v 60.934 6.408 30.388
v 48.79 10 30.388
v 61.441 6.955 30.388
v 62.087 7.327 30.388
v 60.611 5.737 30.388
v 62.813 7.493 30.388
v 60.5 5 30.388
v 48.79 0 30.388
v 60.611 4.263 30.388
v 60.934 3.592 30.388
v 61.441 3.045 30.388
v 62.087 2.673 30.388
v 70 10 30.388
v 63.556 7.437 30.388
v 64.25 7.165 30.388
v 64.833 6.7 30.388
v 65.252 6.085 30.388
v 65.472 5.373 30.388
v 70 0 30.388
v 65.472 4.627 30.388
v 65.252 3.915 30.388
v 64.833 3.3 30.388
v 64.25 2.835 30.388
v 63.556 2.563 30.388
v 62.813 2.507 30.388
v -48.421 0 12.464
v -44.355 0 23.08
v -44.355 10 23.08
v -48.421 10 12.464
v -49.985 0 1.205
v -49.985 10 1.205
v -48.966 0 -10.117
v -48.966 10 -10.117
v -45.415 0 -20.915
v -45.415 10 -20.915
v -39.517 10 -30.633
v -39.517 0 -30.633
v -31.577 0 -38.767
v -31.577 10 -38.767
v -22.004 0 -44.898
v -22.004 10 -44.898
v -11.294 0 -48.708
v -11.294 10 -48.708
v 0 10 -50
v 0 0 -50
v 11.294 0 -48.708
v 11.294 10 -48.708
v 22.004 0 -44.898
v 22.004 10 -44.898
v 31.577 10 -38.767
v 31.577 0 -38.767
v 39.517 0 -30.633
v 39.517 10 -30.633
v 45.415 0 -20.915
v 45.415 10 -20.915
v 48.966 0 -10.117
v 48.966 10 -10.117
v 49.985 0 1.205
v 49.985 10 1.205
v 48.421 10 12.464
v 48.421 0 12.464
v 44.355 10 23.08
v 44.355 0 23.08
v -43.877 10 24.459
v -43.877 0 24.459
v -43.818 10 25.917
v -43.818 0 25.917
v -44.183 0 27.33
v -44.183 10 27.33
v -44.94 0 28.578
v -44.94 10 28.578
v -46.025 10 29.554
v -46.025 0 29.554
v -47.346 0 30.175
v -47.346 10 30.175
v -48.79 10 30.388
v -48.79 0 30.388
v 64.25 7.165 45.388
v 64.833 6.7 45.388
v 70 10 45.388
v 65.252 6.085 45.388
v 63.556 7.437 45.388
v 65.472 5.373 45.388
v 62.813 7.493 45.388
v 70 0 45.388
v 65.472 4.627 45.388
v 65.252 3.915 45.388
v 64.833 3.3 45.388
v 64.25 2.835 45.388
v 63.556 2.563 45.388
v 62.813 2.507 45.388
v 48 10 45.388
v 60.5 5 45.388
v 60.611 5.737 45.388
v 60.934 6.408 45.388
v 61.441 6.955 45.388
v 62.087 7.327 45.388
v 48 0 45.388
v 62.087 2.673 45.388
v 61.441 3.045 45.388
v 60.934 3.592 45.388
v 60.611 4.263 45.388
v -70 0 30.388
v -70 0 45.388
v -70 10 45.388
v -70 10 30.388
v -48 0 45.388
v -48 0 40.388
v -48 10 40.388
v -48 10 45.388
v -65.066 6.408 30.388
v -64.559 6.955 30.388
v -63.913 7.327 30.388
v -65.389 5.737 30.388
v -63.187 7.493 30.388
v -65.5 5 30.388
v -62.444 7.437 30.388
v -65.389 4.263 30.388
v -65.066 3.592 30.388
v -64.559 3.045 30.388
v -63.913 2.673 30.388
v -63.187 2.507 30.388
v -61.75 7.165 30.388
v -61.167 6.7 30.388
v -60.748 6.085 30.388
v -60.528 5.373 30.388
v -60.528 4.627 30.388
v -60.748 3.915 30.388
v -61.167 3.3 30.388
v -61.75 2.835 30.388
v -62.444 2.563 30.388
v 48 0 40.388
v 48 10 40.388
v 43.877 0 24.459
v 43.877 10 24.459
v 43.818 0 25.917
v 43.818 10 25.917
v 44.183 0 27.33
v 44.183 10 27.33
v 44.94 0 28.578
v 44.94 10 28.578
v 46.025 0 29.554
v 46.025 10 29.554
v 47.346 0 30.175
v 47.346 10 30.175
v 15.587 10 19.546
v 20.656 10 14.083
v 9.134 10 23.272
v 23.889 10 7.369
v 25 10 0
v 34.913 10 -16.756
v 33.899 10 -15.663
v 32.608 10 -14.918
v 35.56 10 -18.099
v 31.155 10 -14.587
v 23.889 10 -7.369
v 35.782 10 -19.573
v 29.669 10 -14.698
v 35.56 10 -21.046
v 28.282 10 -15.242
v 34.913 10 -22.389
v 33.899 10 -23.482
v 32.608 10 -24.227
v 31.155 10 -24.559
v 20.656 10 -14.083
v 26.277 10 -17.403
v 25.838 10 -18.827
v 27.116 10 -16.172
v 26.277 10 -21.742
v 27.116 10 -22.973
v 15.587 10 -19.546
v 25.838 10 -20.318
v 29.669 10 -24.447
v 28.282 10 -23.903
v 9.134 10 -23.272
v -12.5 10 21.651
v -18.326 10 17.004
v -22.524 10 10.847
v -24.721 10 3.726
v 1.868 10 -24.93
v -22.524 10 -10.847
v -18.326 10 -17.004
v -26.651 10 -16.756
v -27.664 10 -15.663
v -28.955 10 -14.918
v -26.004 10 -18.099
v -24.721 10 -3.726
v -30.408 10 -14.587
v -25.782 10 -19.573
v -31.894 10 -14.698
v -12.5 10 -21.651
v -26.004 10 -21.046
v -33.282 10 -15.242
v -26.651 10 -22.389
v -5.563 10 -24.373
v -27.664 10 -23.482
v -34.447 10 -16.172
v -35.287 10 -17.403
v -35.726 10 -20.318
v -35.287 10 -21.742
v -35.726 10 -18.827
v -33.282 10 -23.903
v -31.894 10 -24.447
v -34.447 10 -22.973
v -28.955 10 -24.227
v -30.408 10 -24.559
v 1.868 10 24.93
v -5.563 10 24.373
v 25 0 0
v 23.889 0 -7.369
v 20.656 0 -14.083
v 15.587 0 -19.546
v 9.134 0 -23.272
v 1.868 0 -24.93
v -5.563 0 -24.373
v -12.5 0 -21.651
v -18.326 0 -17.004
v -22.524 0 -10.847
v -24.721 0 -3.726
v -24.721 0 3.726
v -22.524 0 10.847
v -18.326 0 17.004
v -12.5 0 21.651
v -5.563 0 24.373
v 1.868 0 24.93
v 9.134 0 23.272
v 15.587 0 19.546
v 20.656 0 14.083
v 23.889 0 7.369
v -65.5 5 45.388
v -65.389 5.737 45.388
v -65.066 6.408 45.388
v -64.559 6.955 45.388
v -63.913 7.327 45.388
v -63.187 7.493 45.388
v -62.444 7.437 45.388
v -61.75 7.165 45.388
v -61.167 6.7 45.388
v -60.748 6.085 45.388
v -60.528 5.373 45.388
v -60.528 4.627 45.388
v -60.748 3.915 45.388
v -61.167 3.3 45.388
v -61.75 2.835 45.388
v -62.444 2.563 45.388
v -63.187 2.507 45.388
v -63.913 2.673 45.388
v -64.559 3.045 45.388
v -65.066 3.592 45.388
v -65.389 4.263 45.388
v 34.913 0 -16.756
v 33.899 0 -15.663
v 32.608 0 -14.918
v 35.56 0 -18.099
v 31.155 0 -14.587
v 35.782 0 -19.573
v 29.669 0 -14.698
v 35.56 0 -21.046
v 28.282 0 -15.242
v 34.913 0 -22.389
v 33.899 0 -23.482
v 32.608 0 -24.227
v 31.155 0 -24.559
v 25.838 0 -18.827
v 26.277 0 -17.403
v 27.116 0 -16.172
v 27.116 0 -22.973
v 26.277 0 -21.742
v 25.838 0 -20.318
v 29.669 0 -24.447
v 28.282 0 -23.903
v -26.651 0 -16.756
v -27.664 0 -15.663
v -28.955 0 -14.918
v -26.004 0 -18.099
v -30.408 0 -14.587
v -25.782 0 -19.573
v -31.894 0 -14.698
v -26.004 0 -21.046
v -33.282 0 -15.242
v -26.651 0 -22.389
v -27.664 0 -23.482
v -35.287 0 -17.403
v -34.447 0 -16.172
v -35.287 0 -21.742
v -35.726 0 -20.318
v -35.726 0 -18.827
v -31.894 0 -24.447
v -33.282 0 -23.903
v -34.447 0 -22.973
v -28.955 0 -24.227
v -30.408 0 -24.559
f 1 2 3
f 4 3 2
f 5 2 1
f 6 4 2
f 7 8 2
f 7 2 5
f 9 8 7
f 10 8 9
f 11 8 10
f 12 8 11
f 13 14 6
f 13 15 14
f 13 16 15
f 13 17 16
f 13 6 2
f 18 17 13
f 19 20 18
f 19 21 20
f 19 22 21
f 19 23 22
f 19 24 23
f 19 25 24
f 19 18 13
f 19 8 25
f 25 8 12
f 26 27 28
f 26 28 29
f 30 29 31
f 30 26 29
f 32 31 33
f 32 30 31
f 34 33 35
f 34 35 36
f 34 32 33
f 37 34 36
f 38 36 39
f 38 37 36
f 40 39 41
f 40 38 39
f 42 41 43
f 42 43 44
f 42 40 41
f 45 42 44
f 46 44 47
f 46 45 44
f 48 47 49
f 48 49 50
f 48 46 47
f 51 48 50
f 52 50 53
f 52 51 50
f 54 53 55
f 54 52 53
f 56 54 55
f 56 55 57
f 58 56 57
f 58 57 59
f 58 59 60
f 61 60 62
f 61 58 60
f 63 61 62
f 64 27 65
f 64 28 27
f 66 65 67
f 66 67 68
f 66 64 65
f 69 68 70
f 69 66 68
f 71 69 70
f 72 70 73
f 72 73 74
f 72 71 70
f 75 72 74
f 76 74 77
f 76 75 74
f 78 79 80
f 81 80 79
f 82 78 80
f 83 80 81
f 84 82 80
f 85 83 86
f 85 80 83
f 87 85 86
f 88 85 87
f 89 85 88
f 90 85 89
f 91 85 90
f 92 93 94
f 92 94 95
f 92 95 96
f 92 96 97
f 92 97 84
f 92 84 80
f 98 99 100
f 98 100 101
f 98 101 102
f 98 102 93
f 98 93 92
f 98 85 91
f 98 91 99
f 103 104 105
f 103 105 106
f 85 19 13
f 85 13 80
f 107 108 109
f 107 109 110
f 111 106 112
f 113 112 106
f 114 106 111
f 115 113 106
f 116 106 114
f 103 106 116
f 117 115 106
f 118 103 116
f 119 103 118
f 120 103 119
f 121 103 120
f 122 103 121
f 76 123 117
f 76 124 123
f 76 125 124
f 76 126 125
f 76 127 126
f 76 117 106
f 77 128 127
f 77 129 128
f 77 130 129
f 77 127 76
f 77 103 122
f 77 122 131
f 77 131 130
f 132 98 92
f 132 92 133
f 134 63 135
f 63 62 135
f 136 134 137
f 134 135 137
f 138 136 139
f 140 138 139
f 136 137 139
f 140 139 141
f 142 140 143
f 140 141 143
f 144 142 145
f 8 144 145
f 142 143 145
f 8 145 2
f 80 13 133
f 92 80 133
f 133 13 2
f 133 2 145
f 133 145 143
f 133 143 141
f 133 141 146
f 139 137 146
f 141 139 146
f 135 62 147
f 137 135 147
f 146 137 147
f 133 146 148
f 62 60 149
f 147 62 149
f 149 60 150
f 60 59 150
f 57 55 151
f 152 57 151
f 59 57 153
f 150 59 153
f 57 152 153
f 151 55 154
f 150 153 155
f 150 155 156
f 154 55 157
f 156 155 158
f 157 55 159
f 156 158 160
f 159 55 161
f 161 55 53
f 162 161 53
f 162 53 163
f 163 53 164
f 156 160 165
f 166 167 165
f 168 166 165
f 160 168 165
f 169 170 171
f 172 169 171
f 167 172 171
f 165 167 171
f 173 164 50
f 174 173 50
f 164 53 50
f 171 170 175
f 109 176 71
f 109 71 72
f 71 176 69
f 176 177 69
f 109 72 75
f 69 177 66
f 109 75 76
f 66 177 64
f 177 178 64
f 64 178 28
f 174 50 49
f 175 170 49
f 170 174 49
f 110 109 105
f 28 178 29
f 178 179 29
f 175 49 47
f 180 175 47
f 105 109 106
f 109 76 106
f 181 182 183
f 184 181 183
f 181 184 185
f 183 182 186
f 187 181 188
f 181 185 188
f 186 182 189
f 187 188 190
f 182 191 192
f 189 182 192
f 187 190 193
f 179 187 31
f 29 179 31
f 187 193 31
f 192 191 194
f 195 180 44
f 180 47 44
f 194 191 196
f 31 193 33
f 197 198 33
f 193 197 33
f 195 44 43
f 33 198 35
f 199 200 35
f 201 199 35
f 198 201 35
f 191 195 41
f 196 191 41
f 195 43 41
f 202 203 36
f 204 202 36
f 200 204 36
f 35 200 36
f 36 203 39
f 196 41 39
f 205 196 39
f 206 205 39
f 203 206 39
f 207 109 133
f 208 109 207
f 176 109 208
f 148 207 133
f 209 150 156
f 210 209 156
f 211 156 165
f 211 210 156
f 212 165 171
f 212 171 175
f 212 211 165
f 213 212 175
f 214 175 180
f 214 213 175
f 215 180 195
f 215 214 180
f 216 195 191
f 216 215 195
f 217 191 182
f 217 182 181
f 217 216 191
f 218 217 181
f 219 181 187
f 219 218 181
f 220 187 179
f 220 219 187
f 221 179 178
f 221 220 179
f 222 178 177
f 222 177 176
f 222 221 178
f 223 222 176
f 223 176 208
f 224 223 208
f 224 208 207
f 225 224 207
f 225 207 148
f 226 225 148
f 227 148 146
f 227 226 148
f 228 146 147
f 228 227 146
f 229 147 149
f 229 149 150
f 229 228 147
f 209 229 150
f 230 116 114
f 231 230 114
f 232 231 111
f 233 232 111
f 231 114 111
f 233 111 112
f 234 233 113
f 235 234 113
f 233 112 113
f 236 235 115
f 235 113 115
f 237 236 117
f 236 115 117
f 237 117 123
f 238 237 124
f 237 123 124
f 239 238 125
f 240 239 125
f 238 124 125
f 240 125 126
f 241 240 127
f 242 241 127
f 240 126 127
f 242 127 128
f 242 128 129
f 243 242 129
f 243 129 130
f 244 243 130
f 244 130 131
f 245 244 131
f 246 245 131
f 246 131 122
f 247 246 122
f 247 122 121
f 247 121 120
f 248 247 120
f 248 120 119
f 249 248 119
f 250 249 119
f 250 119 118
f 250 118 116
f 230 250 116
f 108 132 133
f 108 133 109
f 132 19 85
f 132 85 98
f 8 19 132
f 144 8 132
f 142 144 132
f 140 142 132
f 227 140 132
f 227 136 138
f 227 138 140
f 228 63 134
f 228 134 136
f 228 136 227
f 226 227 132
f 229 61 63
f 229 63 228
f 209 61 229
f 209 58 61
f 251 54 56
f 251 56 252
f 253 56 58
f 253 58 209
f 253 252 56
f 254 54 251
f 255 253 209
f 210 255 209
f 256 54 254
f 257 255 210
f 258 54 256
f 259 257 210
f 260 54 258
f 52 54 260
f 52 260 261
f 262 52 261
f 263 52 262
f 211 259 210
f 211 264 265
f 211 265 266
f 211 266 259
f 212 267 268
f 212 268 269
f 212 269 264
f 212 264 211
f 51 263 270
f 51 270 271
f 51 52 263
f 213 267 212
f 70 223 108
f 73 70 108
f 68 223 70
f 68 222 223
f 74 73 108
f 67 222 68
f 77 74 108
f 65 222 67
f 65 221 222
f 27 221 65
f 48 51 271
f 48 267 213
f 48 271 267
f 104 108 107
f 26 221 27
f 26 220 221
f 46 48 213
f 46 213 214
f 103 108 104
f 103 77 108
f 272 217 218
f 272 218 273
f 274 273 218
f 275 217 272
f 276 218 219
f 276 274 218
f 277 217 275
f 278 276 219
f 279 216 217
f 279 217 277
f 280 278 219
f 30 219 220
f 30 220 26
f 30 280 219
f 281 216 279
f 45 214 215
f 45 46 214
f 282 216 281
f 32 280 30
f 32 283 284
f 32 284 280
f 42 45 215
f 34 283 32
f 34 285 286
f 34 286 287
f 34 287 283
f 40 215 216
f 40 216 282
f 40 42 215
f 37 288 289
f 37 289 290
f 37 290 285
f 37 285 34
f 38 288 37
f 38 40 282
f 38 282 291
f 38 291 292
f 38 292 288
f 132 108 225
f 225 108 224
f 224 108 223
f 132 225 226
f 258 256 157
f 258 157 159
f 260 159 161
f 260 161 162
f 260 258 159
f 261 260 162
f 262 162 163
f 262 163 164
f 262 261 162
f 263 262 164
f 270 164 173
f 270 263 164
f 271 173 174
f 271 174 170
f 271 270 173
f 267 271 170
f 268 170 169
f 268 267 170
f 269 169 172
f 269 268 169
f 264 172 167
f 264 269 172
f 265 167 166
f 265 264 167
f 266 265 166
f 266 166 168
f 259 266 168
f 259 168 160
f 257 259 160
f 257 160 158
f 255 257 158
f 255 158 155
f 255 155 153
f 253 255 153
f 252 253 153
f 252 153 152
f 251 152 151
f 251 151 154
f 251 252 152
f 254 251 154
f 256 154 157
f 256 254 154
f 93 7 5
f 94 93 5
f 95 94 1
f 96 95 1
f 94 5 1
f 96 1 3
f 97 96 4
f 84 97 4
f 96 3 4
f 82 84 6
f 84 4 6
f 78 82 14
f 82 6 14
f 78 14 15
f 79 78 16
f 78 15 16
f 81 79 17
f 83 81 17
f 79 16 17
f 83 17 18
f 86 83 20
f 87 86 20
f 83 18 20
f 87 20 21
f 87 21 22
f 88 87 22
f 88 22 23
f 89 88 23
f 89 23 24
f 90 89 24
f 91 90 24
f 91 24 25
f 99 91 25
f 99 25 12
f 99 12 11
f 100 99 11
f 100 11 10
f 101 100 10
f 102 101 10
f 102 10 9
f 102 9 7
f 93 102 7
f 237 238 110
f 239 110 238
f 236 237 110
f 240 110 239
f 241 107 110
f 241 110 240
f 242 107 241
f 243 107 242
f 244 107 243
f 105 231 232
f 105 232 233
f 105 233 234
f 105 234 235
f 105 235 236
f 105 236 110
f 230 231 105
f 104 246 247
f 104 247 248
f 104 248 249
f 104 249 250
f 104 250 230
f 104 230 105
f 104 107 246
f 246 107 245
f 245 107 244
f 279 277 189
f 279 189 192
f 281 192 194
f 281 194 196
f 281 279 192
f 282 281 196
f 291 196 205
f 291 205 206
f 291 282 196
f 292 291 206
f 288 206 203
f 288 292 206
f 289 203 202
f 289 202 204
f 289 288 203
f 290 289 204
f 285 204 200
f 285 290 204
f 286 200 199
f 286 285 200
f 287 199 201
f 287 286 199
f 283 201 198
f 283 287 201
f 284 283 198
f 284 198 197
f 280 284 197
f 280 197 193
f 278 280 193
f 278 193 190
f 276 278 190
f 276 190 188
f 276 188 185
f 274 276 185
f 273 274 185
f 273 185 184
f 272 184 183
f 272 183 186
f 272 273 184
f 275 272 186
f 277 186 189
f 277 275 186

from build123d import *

# Parameters (mm, degrees)
SKETCH1_R           = 25.000012525
SKETCH1_R_2         = 5
BOSS_EXTRUDE1_DEPTH = 10
SKETCH3_R           = 2.5
CUT_EXTRUDE1_DEPTH  = 16
SKETCH4_R           = 2.5
CUT_EXTRUDE2_DEPTH  = 16
FILLET1_R           = 5
FILLET2_R           = 5


with BuildPart() as part:
    # Sketch1 → Boss-Extrude1 (new body)
    with BuildSketch(Plane(origin=(0, 0, 0), x_dir=(1, 0, 0), z_dir=(0, 1, 0))):
        with BuildLine():
            Line((-70, -30.387602841), (-39.706341981, -30.387602841))
            ThreePointArc((-39.706341981, -30.387602841), (0, 50), (39.706341981, -30.387602841))
            Line((39.706341981, -30.387602841), (70, -30.387602841))
            Line((70, -30.387602841), (70, -45.387602841))
            Line((70, -45.387602841), (48, -45.387602841))
            Line((48, -45.387602841), (48, -40.387602841))
            Line((48, -40.387602841), (-48, -40.387602841))
            Line((-48, -40.387602841), (-48, -45.387602841))
            Line((-48, -45.387602841), (-70, -45.387602841))
            Line((-70, -45.387602841), (-70, -30.387602841))
        make_face()
        Circle(SKETCH1_R, mode=Mode.SUBTRACT)
        with Locations((30.781735211, 19.572623378)):
            Circle(SKETCH1_R_2, mode=Mode.SUBTRACT)
        with Locations((-30.781735211, 19.572623378)):
            Circle(SKETCH1_R_2, mode=Mode.SUBTRACT)
    extrude(amount=BOSS_EXTRUDE1_DEPTH)

    # Sketch3 → Cut-Extrude1 (cut, through all)
    with BuildSketch(Plane(origin=(0, 0, 30.387602841), x_dir=(-1, 0, 0), z_dir=(0, 0, -1))):
        with Locations((-63, 5)):
            Circle(SKETCH3_R)
    extrude(amount=-CUT_EXTRUDE1_DEPTH, mode=Mode.SUBTRACT)

    # Sketch4 → Cut-Extrude2 (cut, through all)
    with BuildSketch(Plane(origin=(0, 0, 30.387602841), x_dir=(-1, 0, 0), z_dir=(0, 0, -1))):
        with Locations((63, 5)):
            Circle(SKETCH4_R)
    extrude(amount=-CUT_EXTRUDE2_DEPTH, mode=Mode.SUBTRACT)

    # Fillet1
    fillet1_edges = [part.edges().sort_by_distance(p)[0] for p in [
        (39.706341981, 5, 30.387602841),
    ]]
    fillet(fillet1_edges, radius=FILLET1_R)

    # Fillet2
    fillet2_edges = [part.edges().sort_by_distance(p)[0] for p in [
        (-39.706341981, 5, 30.387602841),
    ]]
    fillet(fillet2_edges, radius=FILLET2_R)


solid = part.part
